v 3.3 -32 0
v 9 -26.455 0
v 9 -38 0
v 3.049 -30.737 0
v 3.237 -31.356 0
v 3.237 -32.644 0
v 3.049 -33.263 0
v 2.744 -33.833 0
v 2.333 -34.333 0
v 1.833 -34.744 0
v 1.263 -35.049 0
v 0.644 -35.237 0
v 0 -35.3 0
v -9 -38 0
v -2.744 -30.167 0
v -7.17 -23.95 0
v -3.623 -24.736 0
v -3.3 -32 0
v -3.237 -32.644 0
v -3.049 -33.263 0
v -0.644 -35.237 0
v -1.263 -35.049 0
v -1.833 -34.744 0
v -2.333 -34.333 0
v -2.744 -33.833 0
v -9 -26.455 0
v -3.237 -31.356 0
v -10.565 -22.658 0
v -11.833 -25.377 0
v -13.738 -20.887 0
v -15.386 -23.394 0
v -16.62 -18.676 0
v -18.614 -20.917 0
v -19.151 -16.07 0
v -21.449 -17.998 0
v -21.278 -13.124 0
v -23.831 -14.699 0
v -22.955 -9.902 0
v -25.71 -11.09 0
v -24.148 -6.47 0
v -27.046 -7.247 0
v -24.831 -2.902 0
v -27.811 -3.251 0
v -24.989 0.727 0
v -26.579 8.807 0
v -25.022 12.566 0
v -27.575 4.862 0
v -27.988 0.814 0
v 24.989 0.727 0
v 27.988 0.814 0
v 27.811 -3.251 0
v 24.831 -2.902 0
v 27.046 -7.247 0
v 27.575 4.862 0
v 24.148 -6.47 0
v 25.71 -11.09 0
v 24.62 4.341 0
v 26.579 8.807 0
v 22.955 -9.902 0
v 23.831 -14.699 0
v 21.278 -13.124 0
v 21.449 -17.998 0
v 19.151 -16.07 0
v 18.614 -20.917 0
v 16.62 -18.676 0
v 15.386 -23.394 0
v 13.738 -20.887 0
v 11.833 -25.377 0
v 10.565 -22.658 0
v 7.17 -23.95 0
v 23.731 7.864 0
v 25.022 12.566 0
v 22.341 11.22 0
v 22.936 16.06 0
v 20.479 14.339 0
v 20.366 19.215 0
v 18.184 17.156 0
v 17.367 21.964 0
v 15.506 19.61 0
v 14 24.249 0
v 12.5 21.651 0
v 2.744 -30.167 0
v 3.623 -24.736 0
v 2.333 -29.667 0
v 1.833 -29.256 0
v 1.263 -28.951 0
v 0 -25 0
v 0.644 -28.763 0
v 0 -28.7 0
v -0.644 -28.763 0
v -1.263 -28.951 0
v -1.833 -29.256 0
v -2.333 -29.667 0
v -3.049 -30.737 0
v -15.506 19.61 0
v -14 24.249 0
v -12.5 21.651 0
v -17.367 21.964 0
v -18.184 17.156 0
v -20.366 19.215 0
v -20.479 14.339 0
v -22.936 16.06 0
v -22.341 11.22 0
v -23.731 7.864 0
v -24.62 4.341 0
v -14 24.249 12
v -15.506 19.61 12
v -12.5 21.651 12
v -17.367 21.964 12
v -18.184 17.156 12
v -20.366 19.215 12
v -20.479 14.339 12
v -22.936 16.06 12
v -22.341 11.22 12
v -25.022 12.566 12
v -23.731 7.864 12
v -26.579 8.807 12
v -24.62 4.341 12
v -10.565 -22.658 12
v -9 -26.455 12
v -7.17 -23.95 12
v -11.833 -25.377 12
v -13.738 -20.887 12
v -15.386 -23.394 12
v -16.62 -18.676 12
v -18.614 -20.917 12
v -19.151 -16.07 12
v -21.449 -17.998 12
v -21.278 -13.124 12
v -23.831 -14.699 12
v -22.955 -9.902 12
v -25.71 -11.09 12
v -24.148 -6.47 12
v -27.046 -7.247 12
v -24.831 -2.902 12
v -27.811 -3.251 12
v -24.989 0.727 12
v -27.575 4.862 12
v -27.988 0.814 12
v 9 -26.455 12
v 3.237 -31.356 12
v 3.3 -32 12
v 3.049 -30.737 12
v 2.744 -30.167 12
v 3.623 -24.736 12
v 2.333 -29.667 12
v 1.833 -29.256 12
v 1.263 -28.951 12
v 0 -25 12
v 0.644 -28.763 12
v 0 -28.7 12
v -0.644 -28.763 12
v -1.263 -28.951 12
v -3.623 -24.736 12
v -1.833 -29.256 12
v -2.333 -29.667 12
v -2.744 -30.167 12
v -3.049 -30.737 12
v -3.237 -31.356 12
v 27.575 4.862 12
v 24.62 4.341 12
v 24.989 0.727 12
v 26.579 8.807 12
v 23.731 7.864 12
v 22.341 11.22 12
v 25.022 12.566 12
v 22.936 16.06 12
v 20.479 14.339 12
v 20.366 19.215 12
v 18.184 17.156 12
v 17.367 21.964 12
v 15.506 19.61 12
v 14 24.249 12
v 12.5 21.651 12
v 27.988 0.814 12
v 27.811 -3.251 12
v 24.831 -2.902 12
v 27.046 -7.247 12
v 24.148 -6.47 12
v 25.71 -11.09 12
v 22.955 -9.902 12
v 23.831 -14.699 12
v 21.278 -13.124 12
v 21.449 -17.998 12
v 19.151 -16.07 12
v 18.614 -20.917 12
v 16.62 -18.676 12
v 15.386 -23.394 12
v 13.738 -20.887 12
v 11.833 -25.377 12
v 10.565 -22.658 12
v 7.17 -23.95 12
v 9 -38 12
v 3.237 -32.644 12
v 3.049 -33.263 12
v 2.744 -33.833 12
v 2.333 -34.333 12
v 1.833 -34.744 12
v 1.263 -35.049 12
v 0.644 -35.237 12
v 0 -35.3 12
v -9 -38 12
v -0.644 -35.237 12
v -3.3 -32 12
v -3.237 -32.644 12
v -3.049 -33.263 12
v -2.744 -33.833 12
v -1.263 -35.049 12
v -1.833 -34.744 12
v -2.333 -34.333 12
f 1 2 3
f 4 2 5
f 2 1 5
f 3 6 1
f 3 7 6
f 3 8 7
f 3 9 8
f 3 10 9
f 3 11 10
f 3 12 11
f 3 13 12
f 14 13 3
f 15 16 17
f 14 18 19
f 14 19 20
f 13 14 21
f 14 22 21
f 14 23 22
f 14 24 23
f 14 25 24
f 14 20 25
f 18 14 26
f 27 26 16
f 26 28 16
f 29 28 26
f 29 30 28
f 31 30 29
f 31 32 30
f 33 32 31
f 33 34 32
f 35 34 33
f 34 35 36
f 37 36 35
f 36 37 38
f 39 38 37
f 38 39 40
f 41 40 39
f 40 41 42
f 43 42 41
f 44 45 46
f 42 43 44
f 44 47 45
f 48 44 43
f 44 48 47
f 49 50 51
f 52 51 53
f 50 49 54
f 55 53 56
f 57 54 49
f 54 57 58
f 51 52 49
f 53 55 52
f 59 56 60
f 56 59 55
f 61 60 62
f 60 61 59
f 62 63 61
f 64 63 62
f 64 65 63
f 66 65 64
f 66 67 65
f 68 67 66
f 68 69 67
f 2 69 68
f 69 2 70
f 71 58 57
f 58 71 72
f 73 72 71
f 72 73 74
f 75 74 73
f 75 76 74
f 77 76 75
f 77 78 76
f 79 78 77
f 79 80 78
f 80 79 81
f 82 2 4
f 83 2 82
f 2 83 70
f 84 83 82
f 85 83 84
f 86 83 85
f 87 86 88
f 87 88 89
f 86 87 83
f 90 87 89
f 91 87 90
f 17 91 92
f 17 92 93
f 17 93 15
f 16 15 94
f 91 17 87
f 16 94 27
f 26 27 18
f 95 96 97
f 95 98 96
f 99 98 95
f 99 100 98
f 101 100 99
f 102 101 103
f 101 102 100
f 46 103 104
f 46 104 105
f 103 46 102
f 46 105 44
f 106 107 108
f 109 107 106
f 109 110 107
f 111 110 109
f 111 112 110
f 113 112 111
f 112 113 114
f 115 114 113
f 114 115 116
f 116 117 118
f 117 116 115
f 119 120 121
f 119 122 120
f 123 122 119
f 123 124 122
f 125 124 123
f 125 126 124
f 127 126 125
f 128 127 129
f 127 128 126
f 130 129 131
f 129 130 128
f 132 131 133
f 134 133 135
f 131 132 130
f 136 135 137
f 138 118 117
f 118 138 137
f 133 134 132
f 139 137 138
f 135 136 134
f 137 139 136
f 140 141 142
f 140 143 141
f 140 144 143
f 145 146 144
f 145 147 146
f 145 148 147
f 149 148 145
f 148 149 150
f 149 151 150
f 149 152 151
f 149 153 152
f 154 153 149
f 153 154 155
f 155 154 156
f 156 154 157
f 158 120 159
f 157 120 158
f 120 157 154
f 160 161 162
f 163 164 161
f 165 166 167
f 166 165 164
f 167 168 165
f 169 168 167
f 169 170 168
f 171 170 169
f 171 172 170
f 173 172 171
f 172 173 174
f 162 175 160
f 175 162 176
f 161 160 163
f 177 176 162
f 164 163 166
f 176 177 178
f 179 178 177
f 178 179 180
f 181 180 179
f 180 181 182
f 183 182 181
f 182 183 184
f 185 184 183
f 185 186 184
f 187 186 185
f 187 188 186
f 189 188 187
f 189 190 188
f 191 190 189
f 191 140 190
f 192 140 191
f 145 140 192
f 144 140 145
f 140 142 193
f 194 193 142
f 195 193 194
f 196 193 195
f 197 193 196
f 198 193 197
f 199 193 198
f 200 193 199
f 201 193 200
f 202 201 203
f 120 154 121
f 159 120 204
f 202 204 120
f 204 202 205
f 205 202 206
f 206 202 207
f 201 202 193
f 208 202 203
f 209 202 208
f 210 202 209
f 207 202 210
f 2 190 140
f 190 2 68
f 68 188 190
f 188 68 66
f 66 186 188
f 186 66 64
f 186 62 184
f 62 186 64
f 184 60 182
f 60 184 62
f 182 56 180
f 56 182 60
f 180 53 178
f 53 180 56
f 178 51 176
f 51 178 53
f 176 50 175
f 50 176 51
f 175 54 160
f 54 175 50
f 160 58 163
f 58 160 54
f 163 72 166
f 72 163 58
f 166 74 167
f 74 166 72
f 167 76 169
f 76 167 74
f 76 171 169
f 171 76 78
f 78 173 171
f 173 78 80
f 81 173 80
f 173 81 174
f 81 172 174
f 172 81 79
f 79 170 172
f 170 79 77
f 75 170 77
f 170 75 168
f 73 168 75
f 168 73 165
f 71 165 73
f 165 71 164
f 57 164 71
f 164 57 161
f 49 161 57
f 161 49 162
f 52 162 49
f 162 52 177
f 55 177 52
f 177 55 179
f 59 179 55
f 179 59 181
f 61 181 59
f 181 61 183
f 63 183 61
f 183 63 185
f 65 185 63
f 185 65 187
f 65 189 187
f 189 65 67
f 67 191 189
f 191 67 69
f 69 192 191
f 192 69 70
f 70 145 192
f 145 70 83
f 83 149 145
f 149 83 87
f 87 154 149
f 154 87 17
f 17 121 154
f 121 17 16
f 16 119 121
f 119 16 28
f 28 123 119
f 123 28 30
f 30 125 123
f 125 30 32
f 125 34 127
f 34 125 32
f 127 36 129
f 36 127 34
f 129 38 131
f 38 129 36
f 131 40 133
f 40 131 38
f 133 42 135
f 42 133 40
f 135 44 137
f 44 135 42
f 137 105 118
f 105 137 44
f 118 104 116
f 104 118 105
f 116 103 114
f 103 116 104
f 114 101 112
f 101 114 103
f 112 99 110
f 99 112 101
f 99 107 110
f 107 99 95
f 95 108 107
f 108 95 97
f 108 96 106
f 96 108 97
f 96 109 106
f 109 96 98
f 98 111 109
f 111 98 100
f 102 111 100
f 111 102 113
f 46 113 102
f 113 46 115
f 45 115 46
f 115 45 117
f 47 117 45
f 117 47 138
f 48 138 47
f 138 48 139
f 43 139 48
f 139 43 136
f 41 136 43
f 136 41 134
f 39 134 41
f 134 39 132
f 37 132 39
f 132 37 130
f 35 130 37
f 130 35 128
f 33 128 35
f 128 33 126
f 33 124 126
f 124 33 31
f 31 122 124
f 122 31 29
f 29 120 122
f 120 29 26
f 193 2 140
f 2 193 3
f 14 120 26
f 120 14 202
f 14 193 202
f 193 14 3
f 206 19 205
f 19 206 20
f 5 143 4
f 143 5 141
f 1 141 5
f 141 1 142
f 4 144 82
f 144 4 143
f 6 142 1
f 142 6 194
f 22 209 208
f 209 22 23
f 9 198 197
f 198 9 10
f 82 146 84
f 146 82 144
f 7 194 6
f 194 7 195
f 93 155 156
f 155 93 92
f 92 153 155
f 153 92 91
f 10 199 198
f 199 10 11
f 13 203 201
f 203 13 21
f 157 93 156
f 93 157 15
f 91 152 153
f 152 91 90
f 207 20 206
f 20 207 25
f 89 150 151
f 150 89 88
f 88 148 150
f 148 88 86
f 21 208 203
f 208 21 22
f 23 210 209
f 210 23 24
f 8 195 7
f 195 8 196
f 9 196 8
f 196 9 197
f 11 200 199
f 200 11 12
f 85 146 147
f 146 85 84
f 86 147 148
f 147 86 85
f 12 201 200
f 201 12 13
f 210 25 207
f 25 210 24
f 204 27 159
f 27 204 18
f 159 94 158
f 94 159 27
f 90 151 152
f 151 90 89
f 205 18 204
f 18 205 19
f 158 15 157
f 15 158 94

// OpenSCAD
$fn = 32;

// ----------------------------------------------------------------------
// Spring clip: 56 mm outside, 3 mm band, 60 degree opening
// ----------------------------------------------------------------------

// --- parameters (mm) ---
outer_r = 28;             // clip outside radius
inner_r = 25;             // clip bore radius
band = 3;                 // band thickness
clip_w = 12;              // clip width
opening = 60;             // opening angle
tab_w = 18;               // tab width
tab_len = 10;             // tab length past the clip
tab_hole = 6.6;           // tab fixing hole

clip_profile = [[-14, 24.249], [-17.367, 21.964], [-20.366, 19.215], [-22.936, 16.06], [-25.022, 12.566], [-26.579, 8.807], [-27.575, 4.862], [-27.988, 0.814], [-27.811, -3.251], [-27.046, -7.247], [-25.71, -11.09], [-23.831, -14.699], [-21.449, -17.998], [-18.614, -20.917], [-15.386, -23.394], [-11.833, -25.377], [-8.03, -26.824], [-4.058, -27.704], [0, -28], [4.058, -27.704], [8.03, -26.824], [11.833, -25.377], [15.386, -23.394], [18.614, -20.917], [21.449, -17.998], [23.831, -14.699], [25.71, -11.09], [27.046, -7.247], [27.811, -3.251], [27.988, 0.814], [27.575, 4.862], [26.579, 8.807], [25.022, 12.566], [22.936, 16.06], [20.366, 19.215], [17.367, 21.964], [14, 24.249], [12.5, 21.651], [15.506, 19.61], [18.184, 17.156], [20.479, 14.339], [22.341, 11.22], [23.731, 7.864], [24.62, 4.341], [24.989, 0.727], [24.831, -2.902], [24.148, -6.47], [22.955, -9.902], [21.278, -13.124], [19.151, -16.07], [16.62, -18.676], [13.738, -20.887], [10.565, -22.658], [7.17, -23.95], [3.623, -24.736], [0, -25], [-3.623, -24.736], [-7.17, -23.95], [-10.565, -22.658], [-13.738, -20.887], [-16.62, -18.676], [-19.151, -16.07], [-21.278, -13.124], [-22.955, -9.902], [-24.148, -6.47], [-24.831, -2.902], [-24.989, 0.727], [-24.62, 4.341], [-23.731, 7.864], [-22.341, 11.22], [-20.479, 14.339], [-18.184, 17.156], [-15.506, 19.61], [-12.5, 21.651]];

difference() {
  union() {
    linear_extrude(height = clip_w) polygon(clip_profile);
    /* mounting tab, sunk 2 mm into the band */
    translate([-9, -38, 0]) cube([tab_w, 12, clip_w]);
  }
  translate([0, -32, -2.5]) cylinder(h = clip_w + 5, d = tab_hole);
}
